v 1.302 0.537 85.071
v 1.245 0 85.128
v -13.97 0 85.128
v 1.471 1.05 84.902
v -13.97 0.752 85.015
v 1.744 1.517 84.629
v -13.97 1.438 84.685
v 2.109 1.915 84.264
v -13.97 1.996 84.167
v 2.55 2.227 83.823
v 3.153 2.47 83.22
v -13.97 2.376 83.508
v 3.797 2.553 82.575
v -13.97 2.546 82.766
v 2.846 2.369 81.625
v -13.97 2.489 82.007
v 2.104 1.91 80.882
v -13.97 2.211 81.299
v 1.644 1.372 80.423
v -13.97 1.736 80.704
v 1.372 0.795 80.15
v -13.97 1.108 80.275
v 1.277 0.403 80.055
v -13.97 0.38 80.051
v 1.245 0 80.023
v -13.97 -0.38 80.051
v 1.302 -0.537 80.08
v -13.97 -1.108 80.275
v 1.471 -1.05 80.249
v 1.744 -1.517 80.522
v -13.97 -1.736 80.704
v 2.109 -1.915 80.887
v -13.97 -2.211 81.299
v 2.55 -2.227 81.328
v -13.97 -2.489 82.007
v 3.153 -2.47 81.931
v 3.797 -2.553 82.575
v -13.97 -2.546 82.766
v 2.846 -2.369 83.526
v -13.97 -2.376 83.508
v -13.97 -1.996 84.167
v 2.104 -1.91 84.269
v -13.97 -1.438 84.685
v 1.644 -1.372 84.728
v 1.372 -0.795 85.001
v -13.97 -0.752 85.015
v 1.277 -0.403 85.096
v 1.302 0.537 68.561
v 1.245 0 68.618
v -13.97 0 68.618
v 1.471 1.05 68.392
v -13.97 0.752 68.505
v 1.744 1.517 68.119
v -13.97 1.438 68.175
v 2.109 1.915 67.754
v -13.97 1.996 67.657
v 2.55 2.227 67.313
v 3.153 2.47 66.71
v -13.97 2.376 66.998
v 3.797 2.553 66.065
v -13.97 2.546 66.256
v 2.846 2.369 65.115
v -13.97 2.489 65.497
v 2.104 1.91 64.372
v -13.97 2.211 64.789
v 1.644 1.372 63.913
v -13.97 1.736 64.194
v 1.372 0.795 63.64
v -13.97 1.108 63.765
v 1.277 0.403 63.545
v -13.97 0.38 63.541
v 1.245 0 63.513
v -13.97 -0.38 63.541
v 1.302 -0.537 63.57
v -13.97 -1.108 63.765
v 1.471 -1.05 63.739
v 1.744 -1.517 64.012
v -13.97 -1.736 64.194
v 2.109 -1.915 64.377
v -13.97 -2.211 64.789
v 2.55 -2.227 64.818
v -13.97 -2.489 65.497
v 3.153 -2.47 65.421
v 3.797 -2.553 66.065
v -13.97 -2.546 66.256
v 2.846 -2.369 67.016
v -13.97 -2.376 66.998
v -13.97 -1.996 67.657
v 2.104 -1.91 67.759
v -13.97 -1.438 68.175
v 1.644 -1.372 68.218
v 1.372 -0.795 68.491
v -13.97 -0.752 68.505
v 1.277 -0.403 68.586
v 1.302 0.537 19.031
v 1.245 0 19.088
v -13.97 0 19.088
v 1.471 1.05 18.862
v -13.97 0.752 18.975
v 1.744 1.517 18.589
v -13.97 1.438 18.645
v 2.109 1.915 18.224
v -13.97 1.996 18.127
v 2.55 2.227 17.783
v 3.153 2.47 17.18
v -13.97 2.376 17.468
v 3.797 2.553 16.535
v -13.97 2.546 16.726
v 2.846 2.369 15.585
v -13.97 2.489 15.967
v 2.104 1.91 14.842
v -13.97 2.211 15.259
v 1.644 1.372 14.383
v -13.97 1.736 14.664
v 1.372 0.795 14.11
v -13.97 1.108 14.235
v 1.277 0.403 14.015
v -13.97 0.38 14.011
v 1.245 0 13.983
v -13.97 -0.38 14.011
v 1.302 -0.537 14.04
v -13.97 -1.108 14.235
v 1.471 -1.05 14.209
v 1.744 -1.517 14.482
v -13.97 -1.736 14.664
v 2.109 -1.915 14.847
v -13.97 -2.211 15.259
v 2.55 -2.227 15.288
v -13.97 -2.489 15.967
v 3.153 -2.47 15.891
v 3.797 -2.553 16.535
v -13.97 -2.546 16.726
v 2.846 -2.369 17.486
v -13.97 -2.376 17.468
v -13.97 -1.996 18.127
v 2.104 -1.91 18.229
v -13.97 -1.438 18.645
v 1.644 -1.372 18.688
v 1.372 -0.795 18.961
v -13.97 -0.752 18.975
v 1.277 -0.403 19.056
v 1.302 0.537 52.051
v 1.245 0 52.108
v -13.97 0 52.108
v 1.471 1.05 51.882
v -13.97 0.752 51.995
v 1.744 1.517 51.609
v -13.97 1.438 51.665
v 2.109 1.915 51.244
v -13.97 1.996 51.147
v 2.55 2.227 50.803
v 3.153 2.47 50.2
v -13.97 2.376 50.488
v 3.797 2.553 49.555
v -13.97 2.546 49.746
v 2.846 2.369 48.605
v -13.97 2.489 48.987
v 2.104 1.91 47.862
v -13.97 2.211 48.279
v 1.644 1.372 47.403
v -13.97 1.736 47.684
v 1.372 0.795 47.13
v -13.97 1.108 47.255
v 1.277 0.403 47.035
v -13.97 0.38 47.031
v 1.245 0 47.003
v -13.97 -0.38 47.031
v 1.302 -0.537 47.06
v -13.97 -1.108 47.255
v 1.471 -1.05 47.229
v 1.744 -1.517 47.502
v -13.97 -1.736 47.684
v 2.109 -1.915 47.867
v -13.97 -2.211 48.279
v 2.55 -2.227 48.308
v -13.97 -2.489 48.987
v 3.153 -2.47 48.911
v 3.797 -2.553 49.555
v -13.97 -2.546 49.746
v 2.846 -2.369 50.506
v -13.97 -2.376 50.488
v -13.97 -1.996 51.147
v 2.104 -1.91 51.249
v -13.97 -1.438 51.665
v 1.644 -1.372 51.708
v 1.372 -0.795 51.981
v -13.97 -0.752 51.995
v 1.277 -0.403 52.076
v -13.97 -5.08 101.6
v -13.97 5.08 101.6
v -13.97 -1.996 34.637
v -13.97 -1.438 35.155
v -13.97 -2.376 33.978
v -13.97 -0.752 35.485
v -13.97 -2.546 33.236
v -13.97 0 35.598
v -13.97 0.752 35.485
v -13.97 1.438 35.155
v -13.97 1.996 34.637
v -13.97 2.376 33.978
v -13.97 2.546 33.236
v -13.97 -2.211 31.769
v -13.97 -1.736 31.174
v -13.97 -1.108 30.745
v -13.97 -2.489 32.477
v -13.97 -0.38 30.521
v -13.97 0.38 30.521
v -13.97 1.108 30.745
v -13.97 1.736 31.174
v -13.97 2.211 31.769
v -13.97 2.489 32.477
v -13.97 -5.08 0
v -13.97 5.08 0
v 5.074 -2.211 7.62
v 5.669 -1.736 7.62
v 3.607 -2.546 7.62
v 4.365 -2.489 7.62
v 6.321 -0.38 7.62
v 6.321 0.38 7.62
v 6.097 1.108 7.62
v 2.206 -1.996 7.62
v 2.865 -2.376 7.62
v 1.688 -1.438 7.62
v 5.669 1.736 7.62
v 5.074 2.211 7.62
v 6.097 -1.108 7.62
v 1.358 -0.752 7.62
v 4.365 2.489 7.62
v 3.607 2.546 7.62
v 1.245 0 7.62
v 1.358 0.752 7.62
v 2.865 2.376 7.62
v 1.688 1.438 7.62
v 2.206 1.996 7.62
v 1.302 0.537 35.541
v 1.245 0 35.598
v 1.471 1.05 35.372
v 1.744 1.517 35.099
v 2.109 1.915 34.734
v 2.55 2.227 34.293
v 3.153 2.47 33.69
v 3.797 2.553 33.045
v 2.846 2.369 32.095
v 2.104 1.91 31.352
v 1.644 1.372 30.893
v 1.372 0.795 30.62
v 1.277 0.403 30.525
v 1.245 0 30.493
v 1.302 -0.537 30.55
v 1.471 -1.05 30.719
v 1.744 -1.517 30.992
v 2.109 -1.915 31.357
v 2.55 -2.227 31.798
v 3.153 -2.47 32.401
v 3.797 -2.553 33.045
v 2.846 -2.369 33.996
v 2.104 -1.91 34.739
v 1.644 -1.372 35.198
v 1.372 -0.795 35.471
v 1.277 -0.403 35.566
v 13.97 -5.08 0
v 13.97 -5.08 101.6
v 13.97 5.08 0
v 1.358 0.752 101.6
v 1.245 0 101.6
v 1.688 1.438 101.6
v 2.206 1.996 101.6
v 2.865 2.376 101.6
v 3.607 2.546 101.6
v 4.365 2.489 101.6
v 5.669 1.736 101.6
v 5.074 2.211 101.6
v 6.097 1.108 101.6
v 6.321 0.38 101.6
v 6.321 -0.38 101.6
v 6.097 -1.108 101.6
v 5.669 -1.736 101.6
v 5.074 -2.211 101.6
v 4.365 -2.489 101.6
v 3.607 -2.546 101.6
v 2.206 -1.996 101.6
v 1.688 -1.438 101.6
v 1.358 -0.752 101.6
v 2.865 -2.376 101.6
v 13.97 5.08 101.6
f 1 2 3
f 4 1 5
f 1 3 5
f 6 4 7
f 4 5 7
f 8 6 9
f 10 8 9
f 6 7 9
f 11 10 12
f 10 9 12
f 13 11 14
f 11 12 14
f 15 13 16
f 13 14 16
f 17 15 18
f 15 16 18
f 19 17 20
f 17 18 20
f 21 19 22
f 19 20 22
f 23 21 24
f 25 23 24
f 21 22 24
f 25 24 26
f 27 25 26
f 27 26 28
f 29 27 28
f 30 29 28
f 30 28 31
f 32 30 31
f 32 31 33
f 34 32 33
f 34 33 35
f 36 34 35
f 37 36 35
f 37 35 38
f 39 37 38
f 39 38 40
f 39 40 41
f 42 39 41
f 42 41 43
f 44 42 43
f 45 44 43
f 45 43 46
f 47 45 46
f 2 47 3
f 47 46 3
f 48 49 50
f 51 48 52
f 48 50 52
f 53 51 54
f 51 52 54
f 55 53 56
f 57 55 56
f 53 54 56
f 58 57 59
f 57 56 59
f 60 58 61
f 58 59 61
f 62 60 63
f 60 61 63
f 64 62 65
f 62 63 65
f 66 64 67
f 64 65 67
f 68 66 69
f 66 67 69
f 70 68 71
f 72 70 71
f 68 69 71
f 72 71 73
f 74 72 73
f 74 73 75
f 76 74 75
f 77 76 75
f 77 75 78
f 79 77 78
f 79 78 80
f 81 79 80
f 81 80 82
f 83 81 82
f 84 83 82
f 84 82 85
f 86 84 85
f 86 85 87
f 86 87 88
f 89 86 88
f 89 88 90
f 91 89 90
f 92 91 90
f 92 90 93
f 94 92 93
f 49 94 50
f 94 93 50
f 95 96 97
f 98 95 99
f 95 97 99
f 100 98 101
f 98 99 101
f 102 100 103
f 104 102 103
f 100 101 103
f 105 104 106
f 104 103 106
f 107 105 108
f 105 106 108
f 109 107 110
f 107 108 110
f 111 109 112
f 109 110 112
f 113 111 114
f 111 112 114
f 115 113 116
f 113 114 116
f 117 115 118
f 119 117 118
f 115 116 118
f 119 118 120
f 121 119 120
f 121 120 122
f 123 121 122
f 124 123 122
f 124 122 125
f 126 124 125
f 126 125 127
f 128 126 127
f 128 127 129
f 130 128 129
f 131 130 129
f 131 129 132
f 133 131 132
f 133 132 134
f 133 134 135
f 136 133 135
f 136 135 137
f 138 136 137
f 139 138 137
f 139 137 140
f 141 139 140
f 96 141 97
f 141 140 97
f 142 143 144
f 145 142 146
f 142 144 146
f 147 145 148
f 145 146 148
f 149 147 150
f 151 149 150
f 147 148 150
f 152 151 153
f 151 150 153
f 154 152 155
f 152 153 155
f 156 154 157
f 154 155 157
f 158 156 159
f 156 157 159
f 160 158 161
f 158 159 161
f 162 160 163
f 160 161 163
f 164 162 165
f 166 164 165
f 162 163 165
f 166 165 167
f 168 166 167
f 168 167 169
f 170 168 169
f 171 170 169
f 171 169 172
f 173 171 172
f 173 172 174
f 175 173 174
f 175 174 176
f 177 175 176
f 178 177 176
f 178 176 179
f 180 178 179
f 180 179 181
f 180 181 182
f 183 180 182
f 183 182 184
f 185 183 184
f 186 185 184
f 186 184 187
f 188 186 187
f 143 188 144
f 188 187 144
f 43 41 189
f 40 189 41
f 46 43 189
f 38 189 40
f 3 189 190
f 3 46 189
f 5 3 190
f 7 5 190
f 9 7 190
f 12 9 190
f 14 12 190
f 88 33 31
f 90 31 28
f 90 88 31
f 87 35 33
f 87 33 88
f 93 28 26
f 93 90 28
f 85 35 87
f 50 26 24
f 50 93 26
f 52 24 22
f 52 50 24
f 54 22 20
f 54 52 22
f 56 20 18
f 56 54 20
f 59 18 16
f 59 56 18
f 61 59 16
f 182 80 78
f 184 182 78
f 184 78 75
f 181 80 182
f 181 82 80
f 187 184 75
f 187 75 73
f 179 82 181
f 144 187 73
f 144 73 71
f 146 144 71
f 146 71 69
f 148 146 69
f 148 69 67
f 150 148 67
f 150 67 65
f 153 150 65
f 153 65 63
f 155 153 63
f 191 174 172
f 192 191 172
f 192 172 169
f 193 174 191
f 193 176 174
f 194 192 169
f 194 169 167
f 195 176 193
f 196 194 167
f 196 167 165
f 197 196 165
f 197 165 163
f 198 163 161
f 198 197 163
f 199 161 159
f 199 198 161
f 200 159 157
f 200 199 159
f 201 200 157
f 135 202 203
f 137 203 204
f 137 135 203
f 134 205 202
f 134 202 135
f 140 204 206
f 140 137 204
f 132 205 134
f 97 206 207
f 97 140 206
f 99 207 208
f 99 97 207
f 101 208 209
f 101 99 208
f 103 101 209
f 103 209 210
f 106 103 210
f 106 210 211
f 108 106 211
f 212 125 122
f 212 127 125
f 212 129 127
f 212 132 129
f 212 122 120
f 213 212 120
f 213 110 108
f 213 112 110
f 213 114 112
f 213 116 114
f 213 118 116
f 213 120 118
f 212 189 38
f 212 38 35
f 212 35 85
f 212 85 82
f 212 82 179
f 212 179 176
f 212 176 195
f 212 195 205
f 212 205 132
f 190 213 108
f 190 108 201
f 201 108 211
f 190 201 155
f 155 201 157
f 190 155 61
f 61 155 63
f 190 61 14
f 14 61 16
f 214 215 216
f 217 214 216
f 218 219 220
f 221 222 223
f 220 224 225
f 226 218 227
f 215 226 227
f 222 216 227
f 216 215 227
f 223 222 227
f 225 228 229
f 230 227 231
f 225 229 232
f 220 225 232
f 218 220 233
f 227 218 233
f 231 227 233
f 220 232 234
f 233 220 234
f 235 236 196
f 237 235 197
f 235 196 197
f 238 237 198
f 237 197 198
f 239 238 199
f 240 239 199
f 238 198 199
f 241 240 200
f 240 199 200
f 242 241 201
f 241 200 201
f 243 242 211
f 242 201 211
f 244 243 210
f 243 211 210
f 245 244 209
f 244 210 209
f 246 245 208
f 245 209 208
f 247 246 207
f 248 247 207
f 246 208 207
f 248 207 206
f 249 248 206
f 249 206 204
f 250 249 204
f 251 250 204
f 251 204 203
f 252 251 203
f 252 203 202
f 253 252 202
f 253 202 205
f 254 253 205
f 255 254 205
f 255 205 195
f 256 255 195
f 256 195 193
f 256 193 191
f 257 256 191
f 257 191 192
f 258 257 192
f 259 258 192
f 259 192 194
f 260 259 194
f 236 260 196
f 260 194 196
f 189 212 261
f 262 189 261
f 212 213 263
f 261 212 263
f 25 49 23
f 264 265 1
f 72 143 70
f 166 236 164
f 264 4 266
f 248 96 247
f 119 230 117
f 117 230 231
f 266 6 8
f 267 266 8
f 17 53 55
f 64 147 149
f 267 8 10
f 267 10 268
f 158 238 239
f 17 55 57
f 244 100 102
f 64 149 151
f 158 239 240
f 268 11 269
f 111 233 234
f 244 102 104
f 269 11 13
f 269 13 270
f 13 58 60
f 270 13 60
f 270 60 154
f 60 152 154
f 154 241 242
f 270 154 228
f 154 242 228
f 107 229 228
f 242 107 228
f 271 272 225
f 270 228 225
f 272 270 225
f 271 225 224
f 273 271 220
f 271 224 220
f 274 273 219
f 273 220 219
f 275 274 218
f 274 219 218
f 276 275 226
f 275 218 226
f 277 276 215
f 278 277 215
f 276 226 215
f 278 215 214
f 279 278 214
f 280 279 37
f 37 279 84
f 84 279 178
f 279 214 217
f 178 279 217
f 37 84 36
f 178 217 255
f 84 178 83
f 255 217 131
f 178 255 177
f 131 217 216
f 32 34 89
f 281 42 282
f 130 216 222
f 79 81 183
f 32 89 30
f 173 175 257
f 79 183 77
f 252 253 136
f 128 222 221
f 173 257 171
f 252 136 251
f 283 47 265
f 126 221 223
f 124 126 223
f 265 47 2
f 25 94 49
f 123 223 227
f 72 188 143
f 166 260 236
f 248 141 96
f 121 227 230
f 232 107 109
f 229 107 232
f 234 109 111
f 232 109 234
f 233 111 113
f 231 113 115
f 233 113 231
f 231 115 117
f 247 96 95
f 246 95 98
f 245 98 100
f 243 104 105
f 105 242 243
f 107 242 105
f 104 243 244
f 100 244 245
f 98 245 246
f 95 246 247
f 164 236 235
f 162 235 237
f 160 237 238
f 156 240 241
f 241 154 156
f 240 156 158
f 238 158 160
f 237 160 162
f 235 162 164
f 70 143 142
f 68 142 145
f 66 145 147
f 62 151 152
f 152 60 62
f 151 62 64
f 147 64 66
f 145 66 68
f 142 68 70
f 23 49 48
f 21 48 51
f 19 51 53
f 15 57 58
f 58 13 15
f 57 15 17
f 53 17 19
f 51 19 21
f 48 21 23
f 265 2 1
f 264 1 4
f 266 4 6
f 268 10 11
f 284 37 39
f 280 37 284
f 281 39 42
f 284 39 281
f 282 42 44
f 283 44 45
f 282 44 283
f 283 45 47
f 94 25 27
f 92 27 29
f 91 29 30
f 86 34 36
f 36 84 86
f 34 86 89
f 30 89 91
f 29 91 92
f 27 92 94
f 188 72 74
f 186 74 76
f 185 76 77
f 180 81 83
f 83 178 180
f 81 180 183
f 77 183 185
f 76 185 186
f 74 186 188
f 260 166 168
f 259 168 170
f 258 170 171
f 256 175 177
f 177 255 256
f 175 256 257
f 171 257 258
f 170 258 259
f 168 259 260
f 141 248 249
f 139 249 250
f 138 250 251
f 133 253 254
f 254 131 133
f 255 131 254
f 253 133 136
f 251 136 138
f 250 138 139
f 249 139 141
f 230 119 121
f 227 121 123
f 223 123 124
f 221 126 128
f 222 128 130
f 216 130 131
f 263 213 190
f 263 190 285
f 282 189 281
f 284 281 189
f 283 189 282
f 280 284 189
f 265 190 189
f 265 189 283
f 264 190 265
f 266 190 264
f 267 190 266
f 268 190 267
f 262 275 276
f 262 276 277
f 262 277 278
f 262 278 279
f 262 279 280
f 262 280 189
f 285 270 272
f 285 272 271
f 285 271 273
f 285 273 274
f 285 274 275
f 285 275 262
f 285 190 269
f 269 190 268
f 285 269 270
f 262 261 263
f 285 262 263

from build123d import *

# Parameters (mm, degrees)
SKETCH1_W               = 27.94
SKETCH1_H               = 10.16
BOSS_EXTRUDE1_DEPTH     = 101.6
SKETCH3_R               = 2.5527
CUT_EXTRUDE2_DEPTH      = 96.148345755
CUT_EXTRUDE3_REACH      = 107.494
CUT_EXTRUDE3_END_RADIUS = 2.5527
SKETCH4_R               = 2.5527


with BuildPart() as part:
    # Sketch1 → Boss-Extrude1 (new body)
    with BuildSketch(Plane.XY):
        Rectangle(SKETCH1_W, SKETCH1_H)
    extrude(amount=BOSS_EXTRUDE1_DEPTH)

    # Sketch3 → Cut-Extrude2 (cut, through all)
    with BuildSketch(Plane(origin=(0, 0, 7.62), x_dir=(-1, 0, 0), z_dir=(0, 0, -1))):
        with Locations((-3.7973, 0)):
            Circle(SKETCH3_R)
    extrude(amount=-CUT_EXTRUDE2_DEPTH, mode=Mode.SUBTRACT)

    # Cut-Extrude3: up to this cylinder (the profile starts outside it)
    cut_extrude3_end = Plane(origin=(3.7973, 0, 49.5554), z_dir=(0, 0, -1)) * Cylinder(CUT_EXTRUDE3_END_RADIUS, 287.1334, mode=Mode.PRIVATE)
    # Sketch4 → Cut-Extrude3 (cut, up to the surface)
    with BuildSketch(Plane.ZY.offset(13.97), mode=Mode.PRIVATE) as cut_extrude3_sk1:
        with Locations((16.5354, 0)):
            Circle(SKETCH4_R)
    cut_extrude3_tool1 = extrude(cut_extrude3_sk1.sketch, amount=-CUT_EXTRUDE3_REACH, mode=Mode.PRIVATE) - cut_extrude3_end
    add(cut_extrude3_tool1.solids().sort_by_distance((-13.97, 0, 16.5354))[0], mode=Mode.SUBTRACT)
    # Sketch4 → Cut-Extrude3 (cut, up to the surface)
    with BuildSketch(Plane.ZY.offset(13.97), mode=Mode.PRIVATE) as cut_extrude3_sk2:
        with Locations((33.0454, 0)):
            Circle(SKETCH4_R)
    cut_extrude3_tool2 = extrude(cut_extrude3_sk2.sketch, amount=-CUT_EXTRUDE3_REACH, mode=Mode.PRIVATE) - cut_extrude3_end
    add(cut_extrude3_tool2.solids().sort_by_distance((-13.97, 0, 33.0454))[0], mode=Mode.SUBTRACT)
    # Sketch4 → Cut-Extrude3 (cut, up to the surface)
    with BuildSketch(Plane.ZY.offset(13.97), mode=Mode.PRIVATE) as cut_extrude3_sk3:
        with Locations((49.5554, 0)):
            Circle(SKETCH4_R)
    cut_extrude3_tool3 = extrude(cut_extrude3_sk3.sketch, amount=-CUT_EXTRUDE3_REACH, mode=Mode.PRIVATE) - cut_extrude3_end
    add(cut_extrude3_tool3.solids().sort_by_distance((-13.97, 0, 49.5554))[0], mode=Mode.SUBTRACT)
    # Sketch4 → Cut-Extrude3 (cut, up to the surface)
    with BuildSketch(Plane.ZY.offset(13.97), mode=Mode.PRIVATE) as cut_extrude3_sk4:
        with Locations((66.0654, 0)):
            Circle(SKETCH4_R)
    cut_extrude3_tool4 = extrude(cut_extrude3_sk4.sketch, amount=-CUT_EXTRUDE3_REACH, mode=Mode.PRIVATE) - cut_extrude3_end
    add(cut_extrude3_tool4.solids().sort_by_distance((-13.97, 0, 66.0654))[0], mode=Mode.SUBTRACT)
    # Sketch4 → Cut-Extrude3 (cut, up to the surface)
    with BuildSketch(Plane.ZY.offset(13.97), mode=Mode.PRIVATE) as cut_extrude3_sk5:
        with Locations((82.5754, 0)):
            Circle(SKETCH4_R)
    cut_extrude3_tool5 = extrude(cut_extrude3_sk5.sketch, amount=-CUT_EXTRUDE3_REACH, mode=Mode.PRIVATE) - cut_extrude3_end
    add(cut_extrude3_tool5.solids().sort_by_distance((-13.97, 0, 82.5754))[0], mode=Mode.SUBTRACT)


solid = part.part
